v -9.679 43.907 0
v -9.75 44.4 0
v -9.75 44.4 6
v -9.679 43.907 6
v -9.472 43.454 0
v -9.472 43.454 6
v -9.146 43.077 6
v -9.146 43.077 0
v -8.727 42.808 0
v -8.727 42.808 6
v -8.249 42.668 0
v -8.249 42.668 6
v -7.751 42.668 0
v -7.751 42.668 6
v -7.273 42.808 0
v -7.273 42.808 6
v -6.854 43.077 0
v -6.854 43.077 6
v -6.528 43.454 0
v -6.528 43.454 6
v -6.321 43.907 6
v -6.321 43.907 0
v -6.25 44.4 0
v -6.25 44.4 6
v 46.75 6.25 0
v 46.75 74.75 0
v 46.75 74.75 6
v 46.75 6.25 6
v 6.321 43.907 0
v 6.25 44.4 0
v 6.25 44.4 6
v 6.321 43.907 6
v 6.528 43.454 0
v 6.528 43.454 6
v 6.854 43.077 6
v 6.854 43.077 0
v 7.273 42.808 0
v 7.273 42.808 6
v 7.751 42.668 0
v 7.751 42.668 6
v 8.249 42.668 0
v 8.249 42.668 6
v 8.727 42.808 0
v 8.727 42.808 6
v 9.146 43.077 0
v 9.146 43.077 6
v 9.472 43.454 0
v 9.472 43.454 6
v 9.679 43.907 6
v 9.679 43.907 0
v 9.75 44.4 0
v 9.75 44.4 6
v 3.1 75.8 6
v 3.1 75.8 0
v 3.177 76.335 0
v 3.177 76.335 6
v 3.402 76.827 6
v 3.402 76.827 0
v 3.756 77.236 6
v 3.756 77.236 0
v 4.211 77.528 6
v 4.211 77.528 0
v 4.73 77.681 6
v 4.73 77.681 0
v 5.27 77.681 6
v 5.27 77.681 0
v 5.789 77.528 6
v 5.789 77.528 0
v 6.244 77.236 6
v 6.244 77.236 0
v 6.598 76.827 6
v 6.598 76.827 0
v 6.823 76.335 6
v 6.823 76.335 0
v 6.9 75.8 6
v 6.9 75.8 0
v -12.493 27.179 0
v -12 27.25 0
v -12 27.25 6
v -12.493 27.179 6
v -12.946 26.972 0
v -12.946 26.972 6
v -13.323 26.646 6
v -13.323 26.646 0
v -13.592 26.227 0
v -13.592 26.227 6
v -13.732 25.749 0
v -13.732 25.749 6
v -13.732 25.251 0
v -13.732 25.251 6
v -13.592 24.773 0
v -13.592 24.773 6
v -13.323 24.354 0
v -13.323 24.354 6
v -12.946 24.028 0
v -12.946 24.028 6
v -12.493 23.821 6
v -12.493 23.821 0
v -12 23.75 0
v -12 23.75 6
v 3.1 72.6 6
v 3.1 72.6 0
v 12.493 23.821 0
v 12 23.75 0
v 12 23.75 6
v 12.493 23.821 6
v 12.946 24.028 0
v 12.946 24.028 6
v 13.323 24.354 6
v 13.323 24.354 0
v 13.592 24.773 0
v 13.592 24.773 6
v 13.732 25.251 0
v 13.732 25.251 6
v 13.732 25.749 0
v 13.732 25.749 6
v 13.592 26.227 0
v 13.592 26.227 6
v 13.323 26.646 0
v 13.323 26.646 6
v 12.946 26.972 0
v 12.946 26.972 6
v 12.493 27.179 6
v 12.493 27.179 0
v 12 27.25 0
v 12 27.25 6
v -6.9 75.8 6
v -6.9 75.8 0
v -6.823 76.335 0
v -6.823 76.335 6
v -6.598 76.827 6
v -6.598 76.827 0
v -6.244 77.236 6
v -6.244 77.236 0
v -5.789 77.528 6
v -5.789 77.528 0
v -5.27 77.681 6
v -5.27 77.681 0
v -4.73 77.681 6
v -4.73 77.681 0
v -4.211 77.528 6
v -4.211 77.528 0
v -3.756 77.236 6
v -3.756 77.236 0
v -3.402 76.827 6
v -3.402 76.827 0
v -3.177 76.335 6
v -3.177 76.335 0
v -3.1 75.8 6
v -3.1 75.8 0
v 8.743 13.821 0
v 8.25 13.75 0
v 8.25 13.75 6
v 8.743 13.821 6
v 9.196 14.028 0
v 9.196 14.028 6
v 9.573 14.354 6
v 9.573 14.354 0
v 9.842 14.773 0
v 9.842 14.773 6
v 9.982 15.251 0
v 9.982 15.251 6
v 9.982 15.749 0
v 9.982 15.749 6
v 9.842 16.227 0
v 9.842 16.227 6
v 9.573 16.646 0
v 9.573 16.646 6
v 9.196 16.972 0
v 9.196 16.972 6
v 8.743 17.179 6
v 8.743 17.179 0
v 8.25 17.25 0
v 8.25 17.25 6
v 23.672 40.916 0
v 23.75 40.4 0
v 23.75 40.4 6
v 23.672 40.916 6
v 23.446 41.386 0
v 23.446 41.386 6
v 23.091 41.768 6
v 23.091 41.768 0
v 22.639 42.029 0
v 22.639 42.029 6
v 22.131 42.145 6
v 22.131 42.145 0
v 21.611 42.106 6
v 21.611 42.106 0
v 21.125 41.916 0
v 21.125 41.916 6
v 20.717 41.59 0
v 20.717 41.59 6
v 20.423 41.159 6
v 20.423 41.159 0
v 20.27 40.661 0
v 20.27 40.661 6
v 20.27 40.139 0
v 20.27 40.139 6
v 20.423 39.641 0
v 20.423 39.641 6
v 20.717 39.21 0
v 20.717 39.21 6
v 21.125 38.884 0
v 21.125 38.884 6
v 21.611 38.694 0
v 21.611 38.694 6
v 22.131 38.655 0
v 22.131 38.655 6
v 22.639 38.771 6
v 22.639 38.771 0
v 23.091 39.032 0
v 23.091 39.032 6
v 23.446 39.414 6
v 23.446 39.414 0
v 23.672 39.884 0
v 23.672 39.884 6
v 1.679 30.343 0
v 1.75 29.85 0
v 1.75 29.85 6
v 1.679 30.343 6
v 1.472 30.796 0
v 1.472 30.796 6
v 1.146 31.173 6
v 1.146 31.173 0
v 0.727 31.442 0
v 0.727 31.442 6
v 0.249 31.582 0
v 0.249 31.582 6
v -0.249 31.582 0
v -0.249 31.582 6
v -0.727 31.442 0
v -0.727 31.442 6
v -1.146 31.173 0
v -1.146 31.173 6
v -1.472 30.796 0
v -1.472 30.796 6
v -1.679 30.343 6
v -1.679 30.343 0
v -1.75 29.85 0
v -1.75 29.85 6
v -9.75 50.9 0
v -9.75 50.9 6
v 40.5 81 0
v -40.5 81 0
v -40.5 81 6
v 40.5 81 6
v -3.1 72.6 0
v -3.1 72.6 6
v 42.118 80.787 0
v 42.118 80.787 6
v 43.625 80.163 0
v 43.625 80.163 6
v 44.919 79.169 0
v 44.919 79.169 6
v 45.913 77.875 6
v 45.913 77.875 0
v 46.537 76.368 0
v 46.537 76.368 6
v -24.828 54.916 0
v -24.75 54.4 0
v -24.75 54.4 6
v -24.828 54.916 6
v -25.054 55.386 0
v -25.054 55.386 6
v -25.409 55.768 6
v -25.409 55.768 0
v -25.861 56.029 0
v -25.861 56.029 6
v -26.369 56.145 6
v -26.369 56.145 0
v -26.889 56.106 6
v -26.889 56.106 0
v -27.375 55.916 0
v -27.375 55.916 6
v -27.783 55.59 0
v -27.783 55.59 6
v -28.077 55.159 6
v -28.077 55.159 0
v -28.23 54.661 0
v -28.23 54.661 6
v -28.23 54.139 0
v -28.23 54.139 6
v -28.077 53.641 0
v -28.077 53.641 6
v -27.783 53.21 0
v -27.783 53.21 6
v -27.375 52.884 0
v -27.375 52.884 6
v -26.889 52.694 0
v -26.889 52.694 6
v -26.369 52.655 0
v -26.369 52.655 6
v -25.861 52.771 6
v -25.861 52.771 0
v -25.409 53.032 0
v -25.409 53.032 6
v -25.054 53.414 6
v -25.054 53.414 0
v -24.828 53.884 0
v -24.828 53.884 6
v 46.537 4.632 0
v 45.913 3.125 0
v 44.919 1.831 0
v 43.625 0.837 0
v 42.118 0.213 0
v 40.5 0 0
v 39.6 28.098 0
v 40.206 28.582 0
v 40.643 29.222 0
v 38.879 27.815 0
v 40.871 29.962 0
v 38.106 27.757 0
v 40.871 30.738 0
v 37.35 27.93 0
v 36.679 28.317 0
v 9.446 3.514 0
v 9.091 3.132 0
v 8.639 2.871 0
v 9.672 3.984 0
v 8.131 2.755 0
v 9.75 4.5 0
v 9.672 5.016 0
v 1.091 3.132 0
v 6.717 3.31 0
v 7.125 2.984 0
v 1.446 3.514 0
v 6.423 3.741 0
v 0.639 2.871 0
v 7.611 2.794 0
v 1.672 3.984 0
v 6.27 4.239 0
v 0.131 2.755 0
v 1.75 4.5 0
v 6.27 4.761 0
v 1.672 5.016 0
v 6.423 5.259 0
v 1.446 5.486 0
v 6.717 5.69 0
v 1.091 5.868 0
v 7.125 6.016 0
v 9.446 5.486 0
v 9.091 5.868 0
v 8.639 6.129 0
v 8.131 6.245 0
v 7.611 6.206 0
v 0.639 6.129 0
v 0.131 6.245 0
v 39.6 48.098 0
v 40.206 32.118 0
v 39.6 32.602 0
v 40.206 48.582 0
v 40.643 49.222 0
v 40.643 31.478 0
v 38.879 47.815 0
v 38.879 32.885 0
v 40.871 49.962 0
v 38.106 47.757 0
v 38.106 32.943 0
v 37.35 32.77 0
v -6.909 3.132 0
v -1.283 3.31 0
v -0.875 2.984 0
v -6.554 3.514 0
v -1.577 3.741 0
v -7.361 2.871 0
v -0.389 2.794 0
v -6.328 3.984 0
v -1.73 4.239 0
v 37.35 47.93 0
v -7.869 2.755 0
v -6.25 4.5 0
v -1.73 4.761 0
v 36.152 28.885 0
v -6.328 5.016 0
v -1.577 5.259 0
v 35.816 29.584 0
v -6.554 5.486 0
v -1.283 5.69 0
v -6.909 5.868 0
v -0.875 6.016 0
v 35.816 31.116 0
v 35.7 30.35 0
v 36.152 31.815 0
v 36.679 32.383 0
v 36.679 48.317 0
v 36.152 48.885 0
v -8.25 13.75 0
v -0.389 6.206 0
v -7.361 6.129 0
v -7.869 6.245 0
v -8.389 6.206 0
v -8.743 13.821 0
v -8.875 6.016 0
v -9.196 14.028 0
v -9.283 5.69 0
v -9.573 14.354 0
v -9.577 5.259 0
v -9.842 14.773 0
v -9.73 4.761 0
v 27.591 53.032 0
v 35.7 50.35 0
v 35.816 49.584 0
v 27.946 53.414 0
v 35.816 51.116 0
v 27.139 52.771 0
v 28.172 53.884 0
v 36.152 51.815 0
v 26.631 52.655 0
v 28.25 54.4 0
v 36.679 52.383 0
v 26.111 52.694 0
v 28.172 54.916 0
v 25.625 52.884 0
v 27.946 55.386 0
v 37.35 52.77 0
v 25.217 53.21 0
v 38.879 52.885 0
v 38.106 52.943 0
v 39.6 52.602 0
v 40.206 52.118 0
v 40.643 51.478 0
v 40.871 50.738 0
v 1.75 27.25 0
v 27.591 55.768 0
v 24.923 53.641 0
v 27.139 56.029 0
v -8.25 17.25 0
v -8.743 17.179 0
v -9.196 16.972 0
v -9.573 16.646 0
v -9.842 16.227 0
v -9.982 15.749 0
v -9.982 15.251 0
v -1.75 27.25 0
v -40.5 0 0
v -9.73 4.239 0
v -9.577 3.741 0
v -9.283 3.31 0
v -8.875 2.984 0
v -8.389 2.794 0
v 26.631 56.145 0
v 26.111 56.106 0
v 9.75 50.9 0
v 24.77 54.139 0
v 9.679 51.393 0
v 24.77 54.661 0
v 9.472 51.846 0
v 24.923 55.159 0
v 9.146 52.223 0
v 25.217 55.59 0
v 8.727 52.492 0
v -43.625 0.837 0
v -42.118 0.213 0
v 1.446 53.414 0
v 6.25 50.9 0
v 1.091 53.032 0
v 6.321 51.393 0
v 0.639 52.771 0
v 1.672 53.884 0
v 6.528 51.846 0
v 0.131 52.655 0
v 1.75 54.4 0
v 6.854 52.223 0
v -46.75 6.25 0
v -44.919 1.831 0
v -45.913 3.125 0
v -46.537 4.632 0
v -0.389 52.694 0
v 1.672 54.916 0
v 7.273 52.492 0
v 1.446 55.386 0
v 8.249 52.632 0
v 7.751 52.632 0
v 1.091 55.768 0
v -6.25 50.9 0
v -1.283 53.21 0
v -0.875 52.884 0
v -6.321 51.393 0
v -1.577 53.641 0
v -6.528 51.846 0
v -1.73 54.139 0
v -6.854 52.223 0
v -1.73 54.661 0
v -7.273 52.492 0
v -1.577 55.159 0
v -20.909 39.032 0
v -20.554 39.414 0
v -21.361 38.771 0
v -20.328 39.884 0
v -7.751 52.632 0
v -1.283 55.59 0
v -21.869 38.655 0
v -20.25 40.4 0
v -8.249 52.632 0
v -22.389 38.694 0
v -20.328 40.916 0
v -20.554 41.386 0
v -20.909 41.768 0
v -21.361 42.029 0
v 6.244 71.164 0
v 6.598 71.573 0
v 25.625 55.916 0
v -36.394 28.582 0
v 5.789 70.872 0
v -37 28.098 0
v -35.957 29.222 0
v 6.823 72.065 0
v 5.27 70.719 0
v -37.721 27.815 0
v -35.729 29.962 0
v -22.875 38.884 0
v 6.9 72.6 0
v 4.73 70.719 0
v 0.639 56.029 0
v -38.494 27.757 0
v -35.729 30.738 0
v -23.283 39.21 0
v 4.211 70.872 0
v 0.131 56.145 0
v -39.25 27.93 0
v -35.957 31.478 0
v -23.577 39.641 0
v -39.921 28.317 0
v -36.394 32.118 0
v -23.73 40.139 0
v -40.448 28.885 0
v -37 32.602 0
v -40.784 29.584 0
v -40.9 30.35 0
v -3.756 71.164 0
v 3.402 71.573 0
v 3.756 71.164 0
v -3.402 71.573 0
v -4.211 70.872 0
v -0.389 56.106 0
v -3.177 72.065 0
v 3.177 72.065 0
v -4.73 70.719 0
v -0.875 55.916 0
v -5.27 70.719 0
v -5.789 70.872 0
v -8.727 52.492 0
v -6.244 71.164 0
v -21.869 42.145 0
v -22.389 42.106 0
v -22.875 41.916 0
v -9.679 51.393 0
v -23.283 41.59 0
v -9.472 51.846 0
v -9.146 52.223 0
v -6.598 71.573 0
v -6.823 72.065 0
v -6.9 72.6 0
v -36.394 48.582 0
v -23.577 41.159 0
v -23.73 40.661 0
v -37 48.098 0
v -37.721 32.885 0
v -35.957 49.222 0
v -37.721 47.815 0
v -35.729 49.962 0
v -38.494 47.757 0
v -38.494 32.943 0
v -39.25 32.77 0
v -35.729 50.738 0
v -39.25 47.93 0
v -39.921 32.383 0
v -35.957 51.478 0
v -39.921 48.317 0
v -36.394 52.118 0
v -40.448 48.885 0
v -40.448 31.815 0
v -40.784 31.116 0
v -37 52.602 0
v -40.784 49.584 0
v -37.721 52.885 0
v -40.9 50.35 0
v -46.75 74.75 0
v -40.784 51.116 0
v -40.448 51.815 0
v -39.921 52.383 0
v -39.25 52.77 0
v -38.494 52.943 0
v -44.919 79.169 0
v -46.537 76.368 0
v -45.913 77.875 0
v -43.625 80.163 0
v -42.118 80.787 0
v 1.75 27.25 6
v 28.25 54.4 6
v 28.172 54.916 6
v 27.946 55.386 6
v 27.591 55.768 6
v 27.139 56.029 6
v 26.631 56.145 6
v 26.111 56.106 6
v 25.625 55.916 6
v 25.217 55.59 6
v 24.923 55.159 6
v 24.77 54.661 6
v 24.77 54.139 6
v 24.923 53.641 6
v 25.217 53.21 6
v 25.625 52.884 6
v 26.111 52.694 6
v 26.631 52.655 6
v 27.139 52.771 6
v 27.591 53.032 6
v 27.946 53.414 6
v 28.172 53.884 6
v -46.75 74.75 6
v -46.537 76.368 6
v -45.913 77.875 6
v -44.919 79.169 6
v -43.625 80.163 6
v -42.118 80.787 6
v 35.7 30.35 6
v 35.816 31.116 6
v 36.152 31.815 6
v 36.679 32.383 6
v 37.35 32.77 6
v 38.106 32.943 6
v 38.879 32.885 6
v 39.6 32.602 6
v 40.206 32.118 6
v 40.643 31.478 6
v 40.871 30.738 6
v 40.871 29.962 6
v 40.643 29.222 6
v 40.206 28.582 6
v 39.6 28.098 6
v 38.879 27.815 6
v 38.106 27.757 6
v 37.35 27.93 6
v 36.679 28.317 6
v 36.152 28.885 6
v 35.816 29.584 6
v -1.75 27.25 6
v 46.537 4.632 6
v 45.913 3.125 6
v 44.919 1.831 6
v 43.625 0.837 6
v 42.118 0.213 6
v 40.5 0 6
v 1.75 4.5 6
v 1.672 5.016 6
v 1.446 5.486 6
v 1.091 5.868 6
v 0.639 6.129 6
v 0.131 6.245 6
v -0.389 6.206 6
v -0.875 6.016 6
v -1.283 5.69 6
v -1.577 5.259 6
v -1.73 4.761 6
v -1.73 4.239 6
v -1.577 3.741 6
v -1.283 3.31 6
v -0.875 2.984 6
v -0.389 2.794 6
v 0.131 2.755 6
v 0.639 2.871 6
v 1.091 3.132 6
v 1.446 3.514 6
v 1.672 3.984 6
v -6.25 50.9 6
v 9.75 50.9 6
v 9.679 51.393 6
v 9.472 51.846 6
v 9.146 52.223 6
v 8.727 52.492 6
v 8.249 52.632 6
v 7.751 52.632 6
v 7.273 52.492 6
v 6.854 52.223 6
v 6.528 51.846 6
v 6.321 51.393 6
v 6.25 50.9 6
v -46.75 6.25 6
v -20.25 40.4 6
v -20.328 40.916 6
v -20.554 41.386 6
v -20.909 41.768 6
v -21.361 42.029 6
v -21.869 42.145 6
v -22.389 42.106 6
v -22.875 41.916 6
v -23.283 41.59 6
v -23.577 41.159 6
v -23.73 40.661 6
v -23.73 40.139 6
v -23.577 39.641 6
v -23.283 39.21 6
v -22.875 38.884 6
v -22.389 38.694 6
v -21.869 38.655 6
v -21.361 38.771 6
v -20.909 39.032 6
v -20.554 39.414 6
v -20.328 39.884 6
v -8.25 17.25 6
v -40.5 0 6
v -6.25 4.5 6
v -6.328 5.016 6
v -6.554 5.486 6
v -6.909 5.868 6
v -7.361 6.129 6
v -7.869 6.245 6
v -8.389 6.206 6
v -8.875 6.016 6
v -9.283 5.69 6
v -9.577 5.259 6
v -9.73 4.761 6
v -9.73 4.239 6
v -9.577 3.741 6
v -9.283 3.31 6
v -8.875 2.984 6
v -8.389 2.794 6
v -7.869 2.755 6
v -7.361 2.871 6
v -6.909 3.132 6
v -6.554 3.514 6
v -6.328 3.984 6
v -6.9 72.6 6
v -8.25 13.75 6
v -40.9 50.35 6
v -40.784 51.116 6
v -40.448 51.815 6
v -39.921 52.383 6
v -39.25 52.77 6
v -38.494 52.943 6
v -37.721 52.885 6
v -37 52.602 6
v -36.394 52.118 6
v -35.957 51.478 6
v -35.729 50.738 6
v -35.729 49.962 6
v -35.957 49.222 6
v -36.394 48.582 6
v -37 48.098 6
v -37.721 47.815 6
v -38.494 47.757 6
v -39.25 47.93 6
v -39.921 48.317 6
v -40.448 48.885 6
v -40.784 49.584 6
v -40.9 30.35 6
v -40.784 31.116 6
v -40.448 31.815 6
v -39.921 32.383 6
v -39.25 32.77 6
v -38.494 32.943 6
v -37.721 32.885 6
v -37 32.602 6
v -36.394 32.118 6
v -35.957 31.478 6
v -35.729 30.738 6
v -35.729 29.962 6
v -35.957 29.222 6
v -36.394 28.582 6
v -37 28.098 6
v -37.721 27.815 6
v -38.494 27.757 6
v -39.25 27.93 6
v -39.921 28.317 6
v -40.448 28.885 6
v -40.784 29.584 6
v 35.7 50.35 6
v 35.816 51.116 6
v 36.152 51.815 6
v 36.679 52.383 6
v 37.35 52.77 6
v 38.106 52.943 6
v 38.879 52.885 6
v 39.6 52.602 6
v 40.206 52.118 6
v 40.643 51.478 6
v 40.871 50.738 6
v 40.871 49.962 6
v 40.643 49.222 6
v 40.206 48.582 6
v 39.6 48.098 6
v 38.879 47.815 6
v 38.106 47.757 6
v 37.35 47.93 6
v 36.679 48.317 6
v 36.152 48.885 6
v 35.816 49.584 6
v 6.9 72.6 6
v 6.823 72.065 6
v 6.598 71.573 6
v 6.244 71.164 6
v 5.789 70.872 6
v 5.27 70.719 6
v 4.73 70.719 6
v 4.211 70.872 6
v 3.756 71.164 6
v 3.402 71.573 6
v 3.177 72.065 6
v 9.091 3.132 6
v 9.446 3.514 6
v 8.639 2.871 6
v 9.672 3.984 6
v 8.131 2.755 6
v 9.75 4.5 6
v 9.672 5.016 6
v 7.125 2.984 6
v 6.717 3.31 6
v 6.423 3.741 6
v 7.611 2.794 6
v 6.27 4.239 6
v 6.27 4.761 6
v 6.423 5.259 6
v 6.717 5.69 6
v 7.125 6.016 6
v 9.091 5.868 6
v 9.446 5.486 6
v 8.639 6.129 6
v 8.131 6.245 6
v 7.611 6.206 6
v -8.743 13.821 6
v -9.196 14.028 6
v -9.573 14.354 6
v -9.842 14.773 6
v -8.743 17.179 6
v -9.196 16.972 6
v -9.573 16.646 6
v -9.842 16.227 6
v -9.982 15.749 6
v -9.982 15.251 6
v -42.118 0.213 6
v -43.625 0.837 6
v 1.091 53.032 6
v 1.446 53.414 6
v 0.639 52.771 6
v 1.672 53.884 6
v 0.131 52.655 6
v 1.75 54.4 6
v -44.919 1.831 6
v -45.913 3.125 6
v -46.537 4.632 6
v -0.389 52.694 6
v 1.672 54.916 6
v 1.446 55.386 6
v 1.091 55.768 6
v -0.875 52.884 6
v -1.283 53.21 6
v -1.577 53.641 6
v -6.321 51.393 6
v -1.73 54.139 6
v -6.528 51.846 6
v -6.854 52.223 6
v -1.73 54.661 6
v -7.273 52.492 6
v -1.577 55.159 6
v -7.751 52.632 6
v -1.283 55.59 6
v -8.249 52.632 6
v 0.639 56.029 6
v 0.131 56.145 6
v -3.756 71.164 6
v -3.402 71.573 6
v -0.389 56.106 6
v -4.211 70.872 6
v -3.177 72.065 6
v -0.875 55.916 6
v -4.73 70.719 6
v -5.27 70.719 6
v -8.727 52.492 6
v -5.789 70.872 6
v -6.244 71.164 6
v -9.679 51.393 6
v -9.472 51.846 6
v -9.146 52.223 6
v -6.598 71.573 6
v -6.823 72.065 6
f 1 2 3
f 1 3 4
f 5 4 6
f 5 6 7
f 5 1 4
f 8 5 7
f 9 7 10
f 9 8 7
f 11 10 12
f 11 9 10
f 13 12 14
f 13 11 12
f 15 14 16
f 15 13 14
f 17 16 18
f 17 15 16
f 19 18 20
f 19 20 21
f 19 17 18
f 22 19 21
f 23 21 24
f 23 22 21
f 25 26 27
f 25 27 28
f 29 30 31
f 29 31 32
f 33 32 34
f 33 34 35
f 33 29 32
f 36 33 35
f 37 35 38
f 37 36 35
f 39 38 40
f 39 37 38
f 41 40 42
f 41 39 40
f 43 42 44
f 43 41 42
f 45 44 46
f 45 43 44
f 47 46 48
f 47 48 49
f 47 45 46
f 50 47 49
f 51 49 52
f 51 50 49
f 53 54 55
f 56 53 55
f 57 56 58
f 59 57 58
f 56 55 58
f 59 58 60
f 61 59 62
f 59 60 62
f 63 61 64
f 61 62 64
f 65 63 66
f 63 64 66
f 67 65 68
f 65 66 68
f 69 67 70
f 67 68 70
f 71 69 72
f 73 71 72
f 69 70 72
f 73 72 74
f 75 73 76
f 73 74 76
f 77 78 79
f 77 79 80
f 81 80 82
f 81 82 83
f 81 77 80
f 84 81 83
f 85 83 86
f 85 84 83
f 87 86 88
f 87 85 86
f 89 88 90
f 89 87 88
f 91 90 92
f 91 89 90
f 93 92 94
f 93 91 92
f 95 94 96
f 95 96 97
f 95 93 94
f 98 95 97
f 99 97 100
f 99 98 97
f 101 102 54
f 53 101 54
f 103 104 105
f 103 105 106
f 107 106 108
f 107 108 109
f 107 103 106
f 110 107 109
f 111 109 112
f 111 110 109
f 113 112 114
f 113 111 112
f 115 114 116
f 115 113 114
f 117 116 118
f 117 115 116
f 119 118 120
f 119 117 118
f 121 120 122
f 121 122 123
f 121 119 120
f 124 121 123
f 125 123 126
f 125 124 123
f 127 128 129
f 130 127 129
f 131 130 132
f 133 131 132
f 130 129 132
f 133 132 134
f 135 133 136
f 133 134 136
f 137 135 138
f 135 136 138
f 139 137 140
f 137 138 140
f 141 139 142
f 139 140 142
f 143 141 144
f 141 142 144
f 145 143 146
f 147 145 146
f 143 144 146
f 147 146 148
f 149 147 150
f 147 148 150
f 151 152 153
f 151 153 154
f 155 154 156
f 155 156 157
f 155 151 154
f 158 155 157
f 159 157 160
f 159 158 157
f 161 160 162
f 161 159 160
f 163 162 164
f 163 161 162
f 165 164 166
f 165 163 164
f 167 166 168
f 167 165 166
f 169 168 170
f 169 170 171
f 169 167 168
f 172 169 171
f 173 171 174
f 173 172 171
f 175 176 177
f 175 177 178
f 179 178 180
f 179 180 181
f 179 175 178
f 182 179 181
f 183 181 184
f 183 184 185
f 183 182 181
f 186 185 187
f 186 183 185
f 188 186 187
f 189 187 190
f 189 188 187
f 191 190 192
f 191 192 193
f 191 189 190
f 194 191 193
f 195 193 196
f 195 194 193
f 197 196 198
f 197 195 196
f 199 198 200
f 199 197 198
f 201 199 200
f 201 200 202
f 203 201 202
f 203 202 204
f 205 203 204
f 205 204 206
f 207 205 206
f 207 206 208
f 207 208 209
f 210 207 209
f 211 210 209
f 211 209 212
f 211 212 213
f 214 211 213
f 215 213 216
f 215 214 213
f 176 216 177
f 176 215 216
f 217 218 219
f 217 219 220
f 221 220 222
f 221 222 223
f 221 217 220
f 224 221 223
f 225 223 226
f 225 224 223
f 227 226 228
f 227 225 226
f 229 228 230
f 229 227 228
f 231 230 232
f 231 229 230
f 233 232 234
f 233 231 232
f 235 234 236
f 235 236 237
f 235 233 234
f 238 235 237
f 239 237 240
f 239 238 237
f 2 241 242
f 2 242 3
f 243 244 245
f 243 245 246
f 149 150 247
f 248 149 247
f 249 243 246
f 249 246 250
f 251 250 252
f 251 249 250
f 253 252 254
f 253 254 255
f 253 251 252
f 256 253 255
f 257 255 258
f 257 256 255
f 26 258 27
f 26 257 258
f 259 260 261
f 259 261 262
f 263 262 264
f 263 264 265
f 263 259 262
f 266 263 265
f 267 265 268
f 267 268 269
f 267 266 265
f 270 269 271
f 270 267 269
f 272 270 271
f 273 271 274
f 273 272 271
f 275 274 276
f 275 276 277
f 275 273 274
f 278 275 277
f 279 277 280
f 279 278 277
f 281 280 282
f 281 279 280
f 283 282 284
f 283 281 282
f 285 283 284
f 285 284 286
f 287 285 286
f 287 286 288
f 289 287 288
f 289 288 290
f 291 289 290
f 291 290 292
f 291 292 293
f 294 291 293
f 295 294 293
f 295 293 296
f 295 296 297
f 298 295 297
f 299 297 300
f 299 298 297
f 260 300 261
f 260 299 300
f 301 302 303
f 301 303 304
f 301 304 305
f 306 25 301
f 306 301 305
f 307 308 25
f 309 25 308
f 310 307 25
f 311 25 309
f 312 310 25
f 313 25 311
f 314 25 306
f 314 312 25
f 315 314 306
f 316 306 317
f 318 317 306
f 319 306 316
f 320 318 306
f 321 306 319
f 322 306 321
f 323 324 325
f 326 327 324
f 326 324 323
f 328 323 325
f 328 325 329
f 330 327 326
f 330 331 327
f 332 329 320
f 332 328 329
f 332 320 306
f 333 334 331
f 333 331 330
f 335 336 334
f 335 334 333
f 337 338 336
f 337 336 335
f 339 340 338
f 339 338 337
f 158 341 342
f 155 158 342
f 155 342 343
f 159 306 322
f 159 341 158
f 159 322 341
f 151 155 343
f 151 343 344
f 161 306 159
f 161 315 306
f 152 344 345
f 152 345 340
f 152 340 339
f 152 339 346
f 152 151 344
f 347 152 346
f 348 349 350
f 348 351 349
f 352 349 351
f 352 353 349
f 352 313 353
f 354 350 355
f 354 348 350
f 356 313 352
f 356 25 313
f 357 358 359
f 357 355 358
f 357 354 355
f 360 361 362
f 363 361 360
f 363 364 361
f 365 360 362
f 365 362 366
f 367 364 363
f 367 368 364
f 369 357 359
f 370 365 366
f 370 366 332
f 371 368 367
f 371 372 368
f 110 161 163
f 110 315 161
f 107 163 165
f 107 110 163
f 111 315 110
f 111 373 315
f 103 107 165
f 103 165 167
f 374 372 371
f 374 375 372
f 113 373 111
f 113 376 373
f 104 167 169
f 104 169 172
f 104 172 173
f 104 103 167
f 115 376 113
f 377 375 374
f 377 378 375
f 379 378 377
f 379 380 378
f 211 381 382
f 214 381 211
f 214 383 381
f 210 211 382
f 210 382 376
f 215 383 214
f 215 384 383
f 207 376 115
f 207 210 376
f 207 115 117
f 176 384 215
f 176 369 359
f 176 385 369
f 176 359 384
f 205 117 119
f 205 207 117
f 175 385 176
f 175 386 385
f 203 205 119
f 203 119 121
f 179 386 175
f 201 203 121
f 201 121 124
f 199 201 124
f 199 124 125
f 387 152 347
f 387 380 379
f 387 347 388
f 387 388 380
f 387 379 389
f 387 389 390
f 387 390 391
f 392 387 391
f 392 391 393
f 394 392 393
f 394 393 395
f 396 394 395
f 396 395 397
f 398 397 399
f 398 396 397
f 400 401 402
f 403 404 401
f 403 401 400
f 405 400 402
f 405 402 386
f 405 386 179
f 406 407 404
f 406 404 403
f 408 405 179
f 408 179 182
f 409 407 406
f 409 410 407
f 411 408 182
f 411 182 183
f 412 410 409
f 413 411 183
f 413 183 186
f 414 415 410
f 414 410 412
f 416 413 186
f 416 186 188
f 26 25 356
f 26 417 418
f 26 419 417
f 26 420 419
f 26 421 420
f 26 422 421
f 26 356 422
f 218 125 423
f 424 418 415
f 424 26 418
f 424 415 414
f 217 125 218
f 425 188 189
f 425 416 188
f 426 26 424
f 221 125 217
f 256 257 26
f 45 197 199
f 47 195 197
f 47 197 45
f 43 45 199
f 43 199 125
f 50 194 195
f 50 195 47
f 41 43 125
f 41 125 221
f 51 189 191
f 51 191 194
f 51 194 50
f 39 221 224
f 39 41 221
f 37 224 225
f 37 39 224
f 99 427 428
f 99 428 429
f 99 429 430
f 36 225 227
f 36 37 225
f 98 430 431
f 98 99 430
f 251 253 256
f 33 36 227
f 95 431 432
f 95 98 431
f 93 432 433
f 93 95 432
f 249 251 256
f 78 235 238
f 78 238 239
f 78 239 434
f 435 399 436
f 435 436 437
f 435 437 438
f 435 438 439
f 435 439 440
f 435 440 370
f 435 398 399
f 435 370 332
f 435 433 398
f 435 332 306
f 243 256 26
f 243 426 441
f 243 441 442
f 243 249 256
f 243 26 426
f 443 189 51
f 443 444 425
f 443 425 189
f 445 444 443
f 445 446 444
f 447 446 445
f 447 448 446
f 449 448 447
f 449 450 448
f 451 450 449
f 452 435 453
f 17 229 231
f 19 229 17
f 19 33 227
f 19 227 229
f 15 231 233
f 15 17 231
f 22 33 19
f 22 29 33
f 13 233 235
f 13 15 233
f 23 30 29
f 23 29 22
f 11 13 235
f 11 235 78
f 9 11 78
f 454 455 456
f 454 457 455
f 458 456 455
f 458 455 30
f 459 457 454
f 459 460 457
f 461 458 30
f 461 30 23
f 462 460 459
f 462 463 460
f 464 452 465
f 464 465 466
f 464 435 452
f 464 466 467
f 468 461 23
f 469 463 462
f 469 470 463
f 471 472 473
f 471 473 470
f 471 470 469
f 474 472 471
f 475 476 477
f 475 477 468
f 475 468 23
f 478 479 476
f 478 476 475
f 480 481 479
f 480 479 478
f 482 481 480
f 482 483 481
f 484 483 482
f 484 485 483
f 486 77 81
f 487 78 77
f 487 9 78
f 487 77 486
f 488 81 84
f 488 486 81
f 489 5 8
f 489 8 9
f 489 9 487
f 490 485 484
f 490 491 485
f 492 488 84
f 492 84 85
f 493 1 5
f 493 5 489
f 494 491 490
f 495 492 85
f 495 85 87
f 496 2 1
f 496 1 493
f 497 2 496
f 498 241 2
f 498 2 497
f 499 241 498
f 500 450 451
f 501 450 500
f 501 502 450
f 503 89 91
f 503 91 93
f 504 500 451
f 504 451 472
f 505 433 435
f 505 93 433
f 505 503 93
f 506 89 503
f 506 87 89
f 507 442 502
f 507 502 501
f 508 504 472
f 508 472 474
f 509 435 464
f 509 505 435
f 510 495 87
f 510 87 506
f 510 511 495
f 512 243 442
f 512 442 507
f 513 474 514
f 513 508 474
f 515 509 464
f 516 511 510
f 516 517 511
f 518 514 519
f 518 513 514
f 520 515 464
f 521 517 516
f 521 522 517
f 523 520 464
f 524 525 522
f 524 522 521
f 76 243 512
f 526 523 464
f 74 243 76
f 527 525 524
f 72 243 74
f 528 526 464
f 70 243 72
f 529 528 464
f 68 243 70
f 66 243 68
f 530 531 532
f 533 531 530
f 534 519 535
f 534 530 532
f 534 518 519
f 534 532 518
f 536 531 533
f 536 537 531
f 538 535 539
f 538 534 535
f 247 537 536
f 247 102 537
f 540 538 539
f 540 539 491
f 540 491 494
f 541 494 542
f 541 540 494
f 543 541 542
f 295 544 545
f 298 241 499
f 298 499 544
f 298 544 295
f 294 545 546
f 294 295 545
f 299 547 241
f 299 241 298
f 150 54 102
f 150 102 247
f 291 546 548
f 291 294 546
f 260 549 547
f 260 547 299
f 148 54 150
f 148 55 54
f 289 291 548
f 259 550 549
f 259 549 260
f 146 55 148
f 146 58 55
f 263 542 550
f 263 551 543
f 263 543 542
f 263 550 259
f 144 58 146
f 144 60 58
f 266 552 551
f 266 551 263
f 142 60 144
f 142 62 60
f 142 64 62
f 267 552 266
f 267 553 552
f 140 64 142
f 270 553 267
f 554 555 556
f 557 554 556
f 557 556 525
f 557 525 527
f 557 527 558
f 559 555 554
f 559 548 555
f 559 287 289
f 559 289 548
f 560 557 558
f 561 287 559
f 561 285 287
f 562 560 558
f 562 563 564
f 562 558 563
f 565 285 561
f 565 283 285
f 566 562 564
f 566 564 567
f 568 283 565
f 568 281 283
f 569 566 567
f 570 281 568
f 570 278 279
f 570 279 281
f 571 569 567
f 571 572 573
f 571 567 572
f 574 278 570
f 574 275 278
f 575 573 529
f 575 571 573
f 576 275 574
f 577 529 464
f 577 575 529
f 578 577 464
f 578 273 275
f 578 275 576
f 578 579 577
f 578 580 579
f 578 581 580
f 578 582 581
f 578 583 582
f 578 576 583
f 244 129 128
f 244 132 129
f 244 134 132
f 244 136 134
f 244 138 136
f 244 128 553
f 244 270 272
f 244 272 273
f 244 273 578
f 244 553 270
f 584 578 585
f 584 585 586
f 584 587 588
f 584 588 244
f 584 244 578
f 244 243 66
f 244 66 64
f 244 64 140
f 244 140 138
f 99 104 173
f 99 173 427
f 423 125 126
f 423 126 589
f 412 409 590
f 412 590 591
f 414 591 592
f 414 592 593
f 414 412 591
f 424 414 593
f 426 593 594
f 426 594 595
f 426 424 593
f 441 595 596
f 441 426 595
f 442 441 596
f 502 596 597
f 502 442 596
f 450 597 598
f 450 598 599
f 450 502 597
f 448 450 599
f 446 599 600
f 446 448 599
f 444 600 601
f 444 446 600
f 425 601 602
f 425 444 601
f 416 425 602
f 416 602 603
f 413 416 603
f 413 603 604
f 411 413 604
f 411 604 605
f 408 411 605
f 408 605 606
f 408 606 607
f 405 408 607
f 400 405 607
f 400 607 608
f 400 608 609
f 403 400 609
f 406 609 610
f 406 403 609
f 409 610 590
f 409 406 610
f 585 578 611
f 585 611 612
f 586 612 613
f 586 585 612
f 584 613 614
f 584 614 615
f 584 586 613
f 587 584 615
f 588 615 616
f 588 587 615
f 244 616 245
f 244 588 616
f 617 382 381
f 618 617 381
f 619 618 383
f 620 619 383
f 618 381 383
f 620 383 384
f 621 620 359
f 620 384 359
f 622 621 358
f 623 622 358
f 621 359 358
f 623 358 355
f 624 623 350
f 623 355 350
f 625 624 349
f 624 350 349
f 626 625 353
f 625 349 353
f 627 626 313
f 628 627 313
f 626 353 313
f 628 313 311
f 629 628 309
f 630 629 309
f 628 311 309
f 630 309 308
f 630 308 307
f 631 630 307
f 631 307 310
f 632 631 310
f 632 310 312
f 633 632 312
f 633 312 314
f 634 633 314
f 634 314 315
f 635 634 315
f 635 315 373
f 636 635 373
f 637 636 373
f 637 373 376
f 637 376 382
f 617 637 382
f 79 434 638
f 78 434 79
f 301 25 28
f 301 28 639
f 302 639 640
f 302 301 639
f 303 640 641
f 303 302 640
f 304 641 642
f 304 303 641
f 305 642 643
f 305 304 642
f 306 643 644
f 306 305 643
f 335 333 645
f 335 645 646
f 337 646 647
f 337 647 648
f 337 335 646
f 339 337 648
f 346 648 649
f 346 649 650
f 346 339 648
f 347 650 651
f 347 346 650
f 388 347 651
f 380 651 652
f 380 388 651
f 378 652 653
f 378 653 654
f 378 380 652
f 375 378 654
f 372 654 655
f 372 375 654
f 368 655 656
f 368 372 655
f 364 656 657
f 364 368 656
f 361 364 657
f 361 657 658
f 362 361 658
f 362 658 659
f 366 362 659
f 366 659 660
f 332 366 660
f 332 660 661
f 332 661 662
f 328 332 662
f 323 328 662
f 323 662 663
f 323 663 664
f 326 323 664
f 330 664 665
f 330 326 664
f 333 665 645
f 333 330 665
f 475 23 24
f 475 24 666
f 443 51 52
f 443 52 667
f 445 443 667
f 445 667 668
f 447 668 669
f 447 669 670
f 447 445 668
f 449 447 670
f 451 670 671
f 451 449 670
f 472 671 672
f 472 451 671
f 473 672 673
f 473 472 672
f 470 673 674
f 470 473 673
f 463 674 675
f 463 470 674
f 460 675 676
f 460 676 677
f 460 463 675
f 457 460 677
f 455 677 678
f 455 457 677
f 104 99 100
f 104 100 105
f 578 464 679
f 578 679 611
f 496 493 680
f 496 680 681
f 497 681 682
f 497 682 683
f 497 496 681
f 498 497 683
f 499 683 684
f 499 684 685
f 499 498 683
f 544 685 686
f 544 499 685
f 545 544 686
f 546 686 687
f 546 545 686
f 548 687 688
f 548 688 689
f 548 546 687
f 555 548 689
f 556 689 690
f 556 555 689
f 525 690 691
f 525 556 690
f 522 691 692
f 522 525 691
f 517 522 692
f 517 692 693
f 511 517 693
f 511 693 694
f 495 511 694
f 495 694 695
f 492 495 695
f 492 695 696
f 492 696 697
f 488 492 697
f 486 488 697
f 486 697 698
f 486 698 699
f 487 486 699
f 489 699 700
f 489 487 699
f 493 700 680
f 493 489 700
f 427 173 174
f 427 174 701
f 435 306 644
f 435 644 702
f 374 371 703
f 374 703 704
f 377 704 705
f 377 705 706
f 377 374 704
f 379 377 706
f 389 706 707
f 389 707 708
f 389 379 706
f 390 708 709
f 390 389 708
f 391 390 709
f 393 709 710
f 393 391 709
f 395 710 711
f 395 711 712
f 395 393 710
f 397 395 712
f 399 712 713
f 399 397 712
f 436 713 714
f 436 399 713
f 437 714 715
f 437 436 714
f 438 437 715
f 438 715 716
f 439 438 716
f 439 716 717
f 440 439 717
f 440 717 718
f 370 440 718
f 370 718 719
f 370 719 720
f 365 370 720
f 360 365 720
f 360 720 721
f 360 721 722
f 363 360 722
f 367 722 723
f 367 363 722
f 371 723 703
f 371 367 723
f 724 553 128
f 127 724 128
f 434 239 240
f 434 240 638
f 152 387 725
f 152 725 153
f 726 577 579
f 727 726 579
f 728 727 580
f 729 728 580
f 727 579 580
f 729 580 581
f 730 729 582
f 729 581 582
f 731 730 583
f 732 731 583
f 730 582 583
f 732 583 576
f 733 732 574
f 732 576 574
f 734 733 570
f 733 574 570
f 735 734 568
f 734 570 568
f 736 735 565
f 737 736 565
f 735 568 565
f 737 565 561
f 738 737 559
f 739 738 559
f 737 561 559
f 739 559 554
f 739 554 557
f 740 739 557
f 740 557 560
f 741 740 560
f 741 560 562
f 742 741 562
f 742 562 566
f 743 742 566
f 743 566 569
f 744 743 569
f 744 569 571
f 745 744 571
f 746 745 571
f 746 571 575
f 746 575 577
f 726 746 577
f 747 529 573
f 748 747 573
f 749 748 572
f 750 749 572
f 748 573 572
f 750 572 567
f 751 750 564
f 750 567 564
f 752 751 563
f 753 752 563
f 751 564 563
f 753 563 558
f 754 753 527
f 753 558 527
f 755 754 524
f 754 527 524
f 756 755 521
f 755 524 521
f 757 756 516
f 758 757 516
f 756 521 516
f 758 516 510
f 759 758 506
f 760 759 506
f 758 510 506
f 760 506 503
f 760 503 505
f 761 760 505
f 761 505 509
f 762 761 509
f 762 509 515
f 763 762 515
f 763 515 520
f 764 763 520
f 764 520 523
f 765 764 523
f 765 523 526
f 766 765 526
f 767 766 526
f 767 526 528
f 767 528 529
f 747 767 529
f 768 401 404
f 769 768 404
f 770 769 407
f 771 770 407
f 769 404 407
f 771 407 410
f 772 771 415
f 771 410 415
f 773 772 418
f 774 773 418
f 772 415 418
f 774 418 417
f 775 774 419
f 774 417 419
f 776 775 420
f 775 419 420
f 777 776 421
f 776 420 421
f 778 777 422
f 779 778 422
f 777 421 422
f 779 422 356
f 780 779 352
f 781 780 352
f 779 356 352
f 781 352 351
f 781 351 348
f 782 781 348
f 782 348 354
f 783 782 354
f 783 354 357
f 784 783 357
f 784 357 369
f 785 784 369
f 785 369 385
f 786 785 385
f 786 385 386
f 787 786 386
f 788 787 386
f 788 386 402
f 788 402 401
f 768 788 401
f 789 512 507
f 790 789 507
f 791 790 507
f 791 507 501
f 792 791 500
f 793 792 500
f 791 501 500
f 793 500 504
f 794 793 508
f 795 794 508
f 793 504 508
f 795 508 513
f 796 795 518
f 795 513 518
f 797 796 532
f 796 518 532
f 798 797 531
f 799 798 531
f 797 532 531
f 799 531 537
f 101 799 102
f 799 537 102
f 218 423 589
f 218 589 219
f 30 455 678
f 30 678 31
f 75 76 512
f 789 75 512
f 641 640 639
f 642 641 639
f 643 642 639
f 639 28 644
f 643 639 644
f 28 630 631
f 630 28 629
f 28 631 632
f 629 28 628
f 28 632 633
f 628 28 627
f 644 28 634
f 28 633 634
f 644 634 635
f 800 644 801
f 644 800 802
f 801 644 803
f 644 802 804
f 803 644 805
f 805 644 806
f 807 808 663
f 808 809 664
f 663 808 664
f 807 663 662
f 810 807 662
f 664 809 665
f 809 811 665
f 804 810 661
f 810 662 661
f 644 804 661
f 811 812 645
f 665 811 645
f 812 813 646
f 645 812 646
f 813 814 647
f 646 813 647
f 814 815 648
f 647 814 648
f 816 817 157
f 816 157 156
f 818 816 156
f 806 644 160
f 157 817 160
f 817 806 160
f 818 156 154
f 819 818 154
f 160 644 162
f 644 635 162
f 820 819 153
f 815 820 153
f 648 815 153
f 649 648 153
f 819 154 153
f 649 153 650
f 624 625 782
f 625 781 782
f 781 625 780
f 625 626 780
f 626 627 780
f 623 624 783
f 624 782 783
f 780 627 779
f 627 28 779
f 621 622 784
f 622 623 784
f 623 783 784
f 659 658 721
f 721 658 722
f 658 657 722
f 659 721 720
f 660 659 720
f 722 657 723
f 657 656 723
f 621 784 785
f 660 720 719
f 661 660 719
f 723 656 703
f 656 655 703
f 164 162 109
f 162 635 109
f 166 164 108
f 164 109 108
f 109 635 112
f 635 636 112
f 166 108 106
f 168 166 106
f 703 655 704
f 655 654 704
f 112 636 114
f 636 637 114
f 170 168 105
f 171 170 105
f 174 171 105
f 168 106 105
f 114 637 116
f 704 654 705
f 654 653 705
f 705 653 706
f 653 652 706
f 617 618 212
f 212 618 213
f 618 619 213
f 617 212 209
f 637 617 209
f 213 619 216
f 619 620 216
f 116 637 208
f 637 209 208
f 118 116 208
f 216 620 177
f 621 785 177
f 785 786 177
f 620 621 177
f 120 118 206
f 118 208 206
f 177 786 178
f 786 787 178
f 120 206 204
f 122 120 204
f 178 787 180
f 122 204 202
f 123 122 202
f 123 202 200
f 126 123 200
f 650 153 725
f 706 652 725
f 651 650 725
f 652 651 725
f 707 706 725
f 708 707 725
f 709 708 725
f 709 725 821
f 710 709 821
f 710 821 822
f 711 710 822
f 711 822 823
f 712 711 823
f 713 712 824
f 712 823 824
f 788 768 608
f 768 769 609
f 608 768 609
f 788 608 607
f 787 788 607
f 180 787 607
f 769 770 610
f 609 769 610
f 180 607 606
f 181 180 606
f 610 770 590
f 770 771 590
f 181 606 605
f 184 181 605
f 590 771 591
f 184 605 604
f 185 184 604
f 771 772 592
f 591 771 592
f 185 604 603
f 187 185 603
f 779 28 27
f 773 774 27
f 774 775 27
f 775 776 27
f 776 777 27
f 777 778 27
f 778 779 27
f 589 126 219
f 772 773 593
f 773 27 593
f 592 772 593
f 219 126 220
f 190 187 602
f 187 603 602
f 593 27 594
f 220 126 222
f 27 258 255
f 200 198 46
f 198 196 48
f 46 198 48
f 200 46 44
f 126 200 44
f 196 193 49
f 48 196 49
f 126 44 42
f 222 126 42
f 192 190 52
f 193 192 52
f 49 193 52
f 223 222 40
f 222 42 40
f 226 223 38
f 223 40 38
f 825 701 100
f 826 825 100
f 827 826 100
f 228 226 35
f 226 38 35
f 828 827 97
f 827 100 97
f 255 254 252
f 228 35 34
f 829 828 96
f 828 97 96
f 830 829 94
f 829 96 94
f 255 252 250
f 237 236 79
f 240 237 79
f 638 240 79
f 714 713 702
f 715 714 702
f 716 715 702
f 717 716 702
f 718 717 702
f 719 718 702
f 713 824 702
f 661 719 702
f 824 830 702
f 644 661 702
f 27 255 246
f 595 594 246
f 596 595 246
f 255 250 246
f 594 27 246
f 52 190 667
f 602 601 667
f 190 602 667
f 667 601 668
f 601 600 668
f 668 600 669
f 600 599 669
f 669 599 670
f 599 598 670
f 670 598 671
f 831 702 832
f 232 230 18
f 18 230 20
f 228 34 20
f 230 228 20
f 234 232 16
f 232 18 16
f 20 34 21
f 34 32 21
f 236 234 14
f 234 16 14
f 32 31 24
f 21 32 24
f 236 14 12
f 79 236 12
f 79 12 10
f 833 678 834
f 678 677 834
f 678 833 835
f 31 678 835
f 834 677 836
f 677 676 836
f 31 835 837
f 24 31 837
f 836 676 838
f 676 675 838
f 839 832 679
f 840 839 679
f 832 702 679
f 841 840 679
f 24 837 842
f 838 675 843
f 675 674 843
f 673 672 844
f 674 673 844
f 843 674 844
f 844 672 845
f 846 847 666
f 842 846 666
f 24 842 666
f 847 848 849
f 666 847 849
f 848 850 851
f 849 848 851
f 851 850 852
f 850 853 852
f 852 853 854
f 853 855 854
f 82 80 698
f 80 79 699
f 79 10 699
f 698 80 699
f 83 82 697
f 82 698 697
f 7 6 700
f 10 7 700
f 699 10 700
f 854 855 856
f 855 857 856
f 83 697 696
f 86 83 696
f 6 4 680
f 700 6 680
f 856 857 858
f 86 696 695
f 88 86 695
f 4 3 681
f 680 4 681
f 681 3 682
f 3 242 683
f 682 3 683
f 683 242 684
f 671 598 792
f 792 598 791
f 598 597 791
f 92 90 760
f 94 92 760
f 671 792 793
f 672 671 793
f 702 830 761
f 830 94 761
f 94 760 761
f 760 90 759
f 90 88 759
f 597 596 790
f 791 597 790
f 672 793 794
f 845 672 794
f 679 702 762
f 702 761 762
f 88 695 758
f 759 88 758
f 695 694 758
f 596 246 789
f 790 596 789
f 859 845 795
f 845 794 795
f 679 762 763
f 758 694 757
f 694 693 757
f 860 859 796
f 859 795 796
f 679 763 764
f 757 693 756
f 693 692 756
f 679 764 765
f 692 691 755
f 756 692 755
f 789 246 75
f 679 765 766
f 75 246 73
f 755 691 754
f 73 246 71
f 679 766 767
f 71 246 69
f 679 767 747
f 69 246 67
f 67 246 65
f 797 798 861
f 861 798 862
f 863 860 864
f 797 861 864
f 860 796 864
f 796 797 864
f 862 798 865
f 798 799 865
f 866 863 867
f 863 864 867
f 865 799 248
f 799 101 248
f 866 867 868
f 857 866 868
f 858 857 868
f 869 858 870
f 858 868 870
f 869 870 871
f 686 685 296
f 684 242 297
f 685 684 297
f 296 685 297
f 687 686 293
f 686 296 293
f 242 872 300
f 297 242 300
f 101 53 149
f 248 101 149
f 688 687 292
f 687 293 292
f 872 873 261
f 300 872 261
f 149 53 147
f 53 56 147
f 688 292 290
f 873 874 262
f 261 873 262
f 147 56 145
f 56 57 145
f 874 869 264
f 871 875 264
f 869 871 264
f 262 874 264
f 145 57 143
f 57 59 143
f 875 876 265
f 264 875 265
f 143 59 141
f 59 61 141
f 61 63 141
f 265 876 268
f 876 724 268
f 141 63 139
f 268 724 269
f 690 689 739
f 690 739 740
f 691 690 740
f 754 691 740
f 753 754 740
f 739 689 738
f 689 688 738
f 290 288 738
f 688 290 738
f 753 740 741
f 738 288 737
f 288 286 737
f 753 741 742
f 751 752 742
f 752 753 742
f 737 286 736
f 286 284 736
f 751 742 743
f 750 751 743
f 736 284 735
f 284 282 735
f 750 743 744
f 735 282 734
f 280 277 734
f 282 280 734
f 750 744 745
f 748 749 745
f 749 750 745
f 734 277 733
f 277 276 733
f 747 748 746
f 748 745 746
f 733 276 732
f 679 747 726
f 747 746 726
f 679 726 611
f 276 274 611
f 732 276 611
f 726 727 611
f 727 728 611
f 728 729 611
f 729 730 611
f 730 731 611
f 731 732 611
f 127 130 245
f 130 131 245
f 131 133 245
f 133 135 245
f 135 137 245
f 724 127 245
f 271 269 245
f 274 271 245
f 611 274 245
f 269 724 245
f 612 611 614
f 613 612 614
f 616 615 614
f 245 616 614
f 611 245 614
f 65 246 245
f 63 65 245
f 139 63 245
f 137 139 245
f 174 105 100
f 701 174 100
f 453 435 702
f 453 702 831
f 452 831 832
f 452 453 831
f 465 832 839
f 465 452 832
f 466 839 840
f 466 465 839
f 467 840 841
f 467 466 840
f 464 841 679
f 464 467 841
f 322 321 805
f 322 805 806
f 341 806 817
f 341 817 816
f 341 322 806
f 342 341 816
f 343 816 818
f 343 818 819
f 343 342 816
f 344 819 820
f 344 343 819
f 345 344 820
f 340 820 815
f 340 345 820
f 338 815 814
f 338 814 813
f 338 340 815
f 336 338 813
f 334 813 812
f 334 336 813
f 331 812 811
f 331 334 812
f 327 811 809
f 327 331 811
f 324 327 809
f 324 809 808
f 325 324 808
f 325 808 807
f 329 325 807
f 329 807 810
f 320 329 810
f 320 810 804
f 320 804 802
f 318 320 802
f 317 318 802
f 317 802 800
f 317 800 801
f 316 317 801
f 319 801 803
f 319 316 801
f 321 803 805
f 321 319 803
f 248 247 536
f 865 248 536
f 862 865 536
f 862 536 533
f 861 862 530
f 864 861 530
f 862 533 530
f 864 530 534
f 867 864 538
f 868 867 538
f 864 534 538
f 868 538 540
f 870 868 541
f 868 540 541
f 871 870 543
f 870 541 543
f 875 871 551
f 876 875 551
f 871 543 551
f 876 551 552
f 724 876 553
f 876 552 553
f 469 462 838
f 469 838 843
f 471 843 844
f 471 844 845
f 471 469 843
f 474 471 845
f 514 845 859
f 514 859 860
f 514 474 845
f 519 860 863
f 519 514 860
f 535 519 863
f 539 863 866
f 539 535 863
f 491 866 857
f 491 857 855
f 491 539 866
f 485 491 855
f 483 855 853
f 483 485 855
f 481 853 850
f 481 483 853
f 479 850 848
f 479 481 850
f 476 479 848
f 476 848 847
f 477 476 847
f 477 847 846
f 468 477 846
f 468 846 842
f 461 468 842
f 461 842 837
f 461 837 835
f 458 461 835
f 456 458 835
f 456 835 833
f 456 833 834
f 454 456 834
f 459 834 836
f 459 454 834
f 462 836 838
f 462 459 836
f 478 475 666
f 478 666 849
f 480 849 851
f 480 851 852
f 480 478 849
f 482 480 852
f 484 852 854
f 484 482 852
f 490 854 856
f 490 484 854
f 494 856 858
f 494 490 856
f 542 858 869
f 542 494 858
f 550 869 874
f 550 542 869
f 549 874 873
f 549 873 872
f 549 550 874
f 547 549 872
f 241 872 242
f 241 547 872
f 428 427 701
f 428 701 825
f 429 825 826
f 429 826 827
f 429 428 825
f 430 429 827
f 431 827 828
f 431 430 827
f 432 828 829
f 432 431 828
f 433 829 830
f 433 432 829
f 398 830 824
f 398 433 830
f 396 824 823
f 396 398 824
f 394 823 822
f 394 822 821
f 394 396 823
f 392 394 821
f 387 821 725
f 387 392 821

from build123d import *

# Parameters (mm, degrees)
MODEL_R                    = 1.75
BASE_DEPTH                 = 6
F_5_2_5_2_DIAMETER_HOLE1_D = 5.2


with BuildPart() as part:
    # Model → Base (new body)
    with BuildSketch(Plane.XY):
        with BuildLine():
            Line((46.75, 74.75), (46.75, 6.25))
            ThreePointArc((46.75, 6.25), (44.919417382, 1.830582618), (40.5, 0))
            Line((40.5, 0), (-40.5, 0))
            ThreePointArc((-40.5, 0), (-44.919417382, 1.830582618), (-46.75, 6.25))
            Line((-46.75, 6.25), (-46.75, 74.75))
            ThreePointArc((-46.75, 74.75), (-44.919417382, 79.169417382), (-40.5, 81))
            Line((-40.5, 81), (40.5, 81))
            ThreePointArc((40.5, 81), (44.919417382, 79.169417382), (46.75, 74.75))
        make_face()
        with Locations((0, 4.5)):
            Circle(MODEL_R, mode=Mode.SUBTRACT)
        with Locations((8, 4.5)):
            Circle(MODEL_R, mode=Mode.SUBTRACT)
        with Locations((-8, 4.5)):
            Circle(MODEL_R, mode=Mode.SUBTRACT)
        with Locations((0, 54.4)):
            Circle(MODEL_R, mode=Mode.SUBTRACT)
        with Locations((26.5, 54.4)):
            Circle(MODEL_R, mode=Mode.SUBTRACT)
        with Locations((22, 40.4)):
            Circle(MODEL_R, mode=Mode.SUBTRACT)
        with Locations((-22, 40.4)):
            Circle(MODEL_R, mode=Mode.SUBTRACT)
        with Locations((-26.5, 54.4)):
            Circle(MODEL_R, mode=Mode.SUBTRACT)
        with BuildLine():
            Line((-3.1, 75.8), (-3.1, 72.6))
            ThreePointArc((-3.1, 72.6), (-5, 70.7), (-6.9, 72.6))
            Line((-6.9, 72.6), (-6.9, 75.8))
            ThreePointArc((-6.9, 75.8), (-5, 77.7), (-3.1, 75.8))
        make_face(mode=Mode.SUBTRACT)
        with BuildLine():
            Line((-9.75, 50.9), (-9.75, 44.4))
            ThreePointArc((-9.75, 44.4), (-8, 42.65), (-6.25, 44.4))
            Line((-6.25, 44.4), (-6.25, 50.9))
            ThreePointArc((-6.25, 50.9), (-8, 52.65), (-9.75, 50.9))
        make_face(mode=Mode.SUBTRACT)
        with BuildLine():
            Line((3.1, 72.6), (3.1, 75.8))
            ThreePointArc((3.1, 75.8), (5, 77.7), (6.9, 75.8))
            Line((6.9, 75.8), (6.9, 72.6))
            ThreePointArc((6.9, 72.6), (5, 70.7), (3.1, 72.6))
        make_face(mode=Mode.SUBTRACT)
        with BuildLine():
            Line((8.25, 17.25), (-8.25, 17.25))
            ThreePointArc((-8.25, 17.25), (-10, 15.5), (-8.25, 13.75))
            Line((-8.25, 13.75), (8.25, 13.75))
            ThreePointArc((8.25, 13.75), (10, 15.5), (8.25, 17.25))
        make_face(mode=Mode.SUBTRACT)
        with BuildLine():
            Line((9.75, 44.4), (9.75, 50.9))
            ThreePointArc((9.75, 50.9), (8, 52.65), (6.25, 50.9))
            Line((6.25, 50.9), (6.25, 44.4))
            ThreePointArc((6.25, 44.4), (8, 42.65), (9.75, 44.4))
        make_face(mode=Mode.SUBTRACT)
        with BuildLine():
            Line((-1.75, 29.85), (-1.75, 27.25))
            Line((-1.75, 27.25), (-12, 27.25))
            ThreePointArc((-12, 27.25), (-13.75, 25.5), (-12, 23.75))
            Line((-12, 23.75), (12, 23.75))
            ThreePointArc((12, 23.75), (13.75, 25.5), (12, 27.25))
            Line((12, 27.25), (1.75, 27.25))
            Line((1.75, 27.25), (1.75, 29.85))
            ThreePointArc((1.75, 29.85), (0, 31.6), (-1.75, 29.85))
        make_face(mode=Mode.SUBTRACT)
    extrude(amount=BASE_DEPTH)

    # Ø5.2 (5.2) Diameter Hole1 (through all)
    with Locations(Plane.XY.offset(6)):
        with Locations((-38.3, 50.35), (-38.3, 30.35), (38.3, 30.35), (38.3, 50.35)):
            Hole(F_5_2_5_2_DIAMETER_HOLE1_D / 2)


solid = part.part
